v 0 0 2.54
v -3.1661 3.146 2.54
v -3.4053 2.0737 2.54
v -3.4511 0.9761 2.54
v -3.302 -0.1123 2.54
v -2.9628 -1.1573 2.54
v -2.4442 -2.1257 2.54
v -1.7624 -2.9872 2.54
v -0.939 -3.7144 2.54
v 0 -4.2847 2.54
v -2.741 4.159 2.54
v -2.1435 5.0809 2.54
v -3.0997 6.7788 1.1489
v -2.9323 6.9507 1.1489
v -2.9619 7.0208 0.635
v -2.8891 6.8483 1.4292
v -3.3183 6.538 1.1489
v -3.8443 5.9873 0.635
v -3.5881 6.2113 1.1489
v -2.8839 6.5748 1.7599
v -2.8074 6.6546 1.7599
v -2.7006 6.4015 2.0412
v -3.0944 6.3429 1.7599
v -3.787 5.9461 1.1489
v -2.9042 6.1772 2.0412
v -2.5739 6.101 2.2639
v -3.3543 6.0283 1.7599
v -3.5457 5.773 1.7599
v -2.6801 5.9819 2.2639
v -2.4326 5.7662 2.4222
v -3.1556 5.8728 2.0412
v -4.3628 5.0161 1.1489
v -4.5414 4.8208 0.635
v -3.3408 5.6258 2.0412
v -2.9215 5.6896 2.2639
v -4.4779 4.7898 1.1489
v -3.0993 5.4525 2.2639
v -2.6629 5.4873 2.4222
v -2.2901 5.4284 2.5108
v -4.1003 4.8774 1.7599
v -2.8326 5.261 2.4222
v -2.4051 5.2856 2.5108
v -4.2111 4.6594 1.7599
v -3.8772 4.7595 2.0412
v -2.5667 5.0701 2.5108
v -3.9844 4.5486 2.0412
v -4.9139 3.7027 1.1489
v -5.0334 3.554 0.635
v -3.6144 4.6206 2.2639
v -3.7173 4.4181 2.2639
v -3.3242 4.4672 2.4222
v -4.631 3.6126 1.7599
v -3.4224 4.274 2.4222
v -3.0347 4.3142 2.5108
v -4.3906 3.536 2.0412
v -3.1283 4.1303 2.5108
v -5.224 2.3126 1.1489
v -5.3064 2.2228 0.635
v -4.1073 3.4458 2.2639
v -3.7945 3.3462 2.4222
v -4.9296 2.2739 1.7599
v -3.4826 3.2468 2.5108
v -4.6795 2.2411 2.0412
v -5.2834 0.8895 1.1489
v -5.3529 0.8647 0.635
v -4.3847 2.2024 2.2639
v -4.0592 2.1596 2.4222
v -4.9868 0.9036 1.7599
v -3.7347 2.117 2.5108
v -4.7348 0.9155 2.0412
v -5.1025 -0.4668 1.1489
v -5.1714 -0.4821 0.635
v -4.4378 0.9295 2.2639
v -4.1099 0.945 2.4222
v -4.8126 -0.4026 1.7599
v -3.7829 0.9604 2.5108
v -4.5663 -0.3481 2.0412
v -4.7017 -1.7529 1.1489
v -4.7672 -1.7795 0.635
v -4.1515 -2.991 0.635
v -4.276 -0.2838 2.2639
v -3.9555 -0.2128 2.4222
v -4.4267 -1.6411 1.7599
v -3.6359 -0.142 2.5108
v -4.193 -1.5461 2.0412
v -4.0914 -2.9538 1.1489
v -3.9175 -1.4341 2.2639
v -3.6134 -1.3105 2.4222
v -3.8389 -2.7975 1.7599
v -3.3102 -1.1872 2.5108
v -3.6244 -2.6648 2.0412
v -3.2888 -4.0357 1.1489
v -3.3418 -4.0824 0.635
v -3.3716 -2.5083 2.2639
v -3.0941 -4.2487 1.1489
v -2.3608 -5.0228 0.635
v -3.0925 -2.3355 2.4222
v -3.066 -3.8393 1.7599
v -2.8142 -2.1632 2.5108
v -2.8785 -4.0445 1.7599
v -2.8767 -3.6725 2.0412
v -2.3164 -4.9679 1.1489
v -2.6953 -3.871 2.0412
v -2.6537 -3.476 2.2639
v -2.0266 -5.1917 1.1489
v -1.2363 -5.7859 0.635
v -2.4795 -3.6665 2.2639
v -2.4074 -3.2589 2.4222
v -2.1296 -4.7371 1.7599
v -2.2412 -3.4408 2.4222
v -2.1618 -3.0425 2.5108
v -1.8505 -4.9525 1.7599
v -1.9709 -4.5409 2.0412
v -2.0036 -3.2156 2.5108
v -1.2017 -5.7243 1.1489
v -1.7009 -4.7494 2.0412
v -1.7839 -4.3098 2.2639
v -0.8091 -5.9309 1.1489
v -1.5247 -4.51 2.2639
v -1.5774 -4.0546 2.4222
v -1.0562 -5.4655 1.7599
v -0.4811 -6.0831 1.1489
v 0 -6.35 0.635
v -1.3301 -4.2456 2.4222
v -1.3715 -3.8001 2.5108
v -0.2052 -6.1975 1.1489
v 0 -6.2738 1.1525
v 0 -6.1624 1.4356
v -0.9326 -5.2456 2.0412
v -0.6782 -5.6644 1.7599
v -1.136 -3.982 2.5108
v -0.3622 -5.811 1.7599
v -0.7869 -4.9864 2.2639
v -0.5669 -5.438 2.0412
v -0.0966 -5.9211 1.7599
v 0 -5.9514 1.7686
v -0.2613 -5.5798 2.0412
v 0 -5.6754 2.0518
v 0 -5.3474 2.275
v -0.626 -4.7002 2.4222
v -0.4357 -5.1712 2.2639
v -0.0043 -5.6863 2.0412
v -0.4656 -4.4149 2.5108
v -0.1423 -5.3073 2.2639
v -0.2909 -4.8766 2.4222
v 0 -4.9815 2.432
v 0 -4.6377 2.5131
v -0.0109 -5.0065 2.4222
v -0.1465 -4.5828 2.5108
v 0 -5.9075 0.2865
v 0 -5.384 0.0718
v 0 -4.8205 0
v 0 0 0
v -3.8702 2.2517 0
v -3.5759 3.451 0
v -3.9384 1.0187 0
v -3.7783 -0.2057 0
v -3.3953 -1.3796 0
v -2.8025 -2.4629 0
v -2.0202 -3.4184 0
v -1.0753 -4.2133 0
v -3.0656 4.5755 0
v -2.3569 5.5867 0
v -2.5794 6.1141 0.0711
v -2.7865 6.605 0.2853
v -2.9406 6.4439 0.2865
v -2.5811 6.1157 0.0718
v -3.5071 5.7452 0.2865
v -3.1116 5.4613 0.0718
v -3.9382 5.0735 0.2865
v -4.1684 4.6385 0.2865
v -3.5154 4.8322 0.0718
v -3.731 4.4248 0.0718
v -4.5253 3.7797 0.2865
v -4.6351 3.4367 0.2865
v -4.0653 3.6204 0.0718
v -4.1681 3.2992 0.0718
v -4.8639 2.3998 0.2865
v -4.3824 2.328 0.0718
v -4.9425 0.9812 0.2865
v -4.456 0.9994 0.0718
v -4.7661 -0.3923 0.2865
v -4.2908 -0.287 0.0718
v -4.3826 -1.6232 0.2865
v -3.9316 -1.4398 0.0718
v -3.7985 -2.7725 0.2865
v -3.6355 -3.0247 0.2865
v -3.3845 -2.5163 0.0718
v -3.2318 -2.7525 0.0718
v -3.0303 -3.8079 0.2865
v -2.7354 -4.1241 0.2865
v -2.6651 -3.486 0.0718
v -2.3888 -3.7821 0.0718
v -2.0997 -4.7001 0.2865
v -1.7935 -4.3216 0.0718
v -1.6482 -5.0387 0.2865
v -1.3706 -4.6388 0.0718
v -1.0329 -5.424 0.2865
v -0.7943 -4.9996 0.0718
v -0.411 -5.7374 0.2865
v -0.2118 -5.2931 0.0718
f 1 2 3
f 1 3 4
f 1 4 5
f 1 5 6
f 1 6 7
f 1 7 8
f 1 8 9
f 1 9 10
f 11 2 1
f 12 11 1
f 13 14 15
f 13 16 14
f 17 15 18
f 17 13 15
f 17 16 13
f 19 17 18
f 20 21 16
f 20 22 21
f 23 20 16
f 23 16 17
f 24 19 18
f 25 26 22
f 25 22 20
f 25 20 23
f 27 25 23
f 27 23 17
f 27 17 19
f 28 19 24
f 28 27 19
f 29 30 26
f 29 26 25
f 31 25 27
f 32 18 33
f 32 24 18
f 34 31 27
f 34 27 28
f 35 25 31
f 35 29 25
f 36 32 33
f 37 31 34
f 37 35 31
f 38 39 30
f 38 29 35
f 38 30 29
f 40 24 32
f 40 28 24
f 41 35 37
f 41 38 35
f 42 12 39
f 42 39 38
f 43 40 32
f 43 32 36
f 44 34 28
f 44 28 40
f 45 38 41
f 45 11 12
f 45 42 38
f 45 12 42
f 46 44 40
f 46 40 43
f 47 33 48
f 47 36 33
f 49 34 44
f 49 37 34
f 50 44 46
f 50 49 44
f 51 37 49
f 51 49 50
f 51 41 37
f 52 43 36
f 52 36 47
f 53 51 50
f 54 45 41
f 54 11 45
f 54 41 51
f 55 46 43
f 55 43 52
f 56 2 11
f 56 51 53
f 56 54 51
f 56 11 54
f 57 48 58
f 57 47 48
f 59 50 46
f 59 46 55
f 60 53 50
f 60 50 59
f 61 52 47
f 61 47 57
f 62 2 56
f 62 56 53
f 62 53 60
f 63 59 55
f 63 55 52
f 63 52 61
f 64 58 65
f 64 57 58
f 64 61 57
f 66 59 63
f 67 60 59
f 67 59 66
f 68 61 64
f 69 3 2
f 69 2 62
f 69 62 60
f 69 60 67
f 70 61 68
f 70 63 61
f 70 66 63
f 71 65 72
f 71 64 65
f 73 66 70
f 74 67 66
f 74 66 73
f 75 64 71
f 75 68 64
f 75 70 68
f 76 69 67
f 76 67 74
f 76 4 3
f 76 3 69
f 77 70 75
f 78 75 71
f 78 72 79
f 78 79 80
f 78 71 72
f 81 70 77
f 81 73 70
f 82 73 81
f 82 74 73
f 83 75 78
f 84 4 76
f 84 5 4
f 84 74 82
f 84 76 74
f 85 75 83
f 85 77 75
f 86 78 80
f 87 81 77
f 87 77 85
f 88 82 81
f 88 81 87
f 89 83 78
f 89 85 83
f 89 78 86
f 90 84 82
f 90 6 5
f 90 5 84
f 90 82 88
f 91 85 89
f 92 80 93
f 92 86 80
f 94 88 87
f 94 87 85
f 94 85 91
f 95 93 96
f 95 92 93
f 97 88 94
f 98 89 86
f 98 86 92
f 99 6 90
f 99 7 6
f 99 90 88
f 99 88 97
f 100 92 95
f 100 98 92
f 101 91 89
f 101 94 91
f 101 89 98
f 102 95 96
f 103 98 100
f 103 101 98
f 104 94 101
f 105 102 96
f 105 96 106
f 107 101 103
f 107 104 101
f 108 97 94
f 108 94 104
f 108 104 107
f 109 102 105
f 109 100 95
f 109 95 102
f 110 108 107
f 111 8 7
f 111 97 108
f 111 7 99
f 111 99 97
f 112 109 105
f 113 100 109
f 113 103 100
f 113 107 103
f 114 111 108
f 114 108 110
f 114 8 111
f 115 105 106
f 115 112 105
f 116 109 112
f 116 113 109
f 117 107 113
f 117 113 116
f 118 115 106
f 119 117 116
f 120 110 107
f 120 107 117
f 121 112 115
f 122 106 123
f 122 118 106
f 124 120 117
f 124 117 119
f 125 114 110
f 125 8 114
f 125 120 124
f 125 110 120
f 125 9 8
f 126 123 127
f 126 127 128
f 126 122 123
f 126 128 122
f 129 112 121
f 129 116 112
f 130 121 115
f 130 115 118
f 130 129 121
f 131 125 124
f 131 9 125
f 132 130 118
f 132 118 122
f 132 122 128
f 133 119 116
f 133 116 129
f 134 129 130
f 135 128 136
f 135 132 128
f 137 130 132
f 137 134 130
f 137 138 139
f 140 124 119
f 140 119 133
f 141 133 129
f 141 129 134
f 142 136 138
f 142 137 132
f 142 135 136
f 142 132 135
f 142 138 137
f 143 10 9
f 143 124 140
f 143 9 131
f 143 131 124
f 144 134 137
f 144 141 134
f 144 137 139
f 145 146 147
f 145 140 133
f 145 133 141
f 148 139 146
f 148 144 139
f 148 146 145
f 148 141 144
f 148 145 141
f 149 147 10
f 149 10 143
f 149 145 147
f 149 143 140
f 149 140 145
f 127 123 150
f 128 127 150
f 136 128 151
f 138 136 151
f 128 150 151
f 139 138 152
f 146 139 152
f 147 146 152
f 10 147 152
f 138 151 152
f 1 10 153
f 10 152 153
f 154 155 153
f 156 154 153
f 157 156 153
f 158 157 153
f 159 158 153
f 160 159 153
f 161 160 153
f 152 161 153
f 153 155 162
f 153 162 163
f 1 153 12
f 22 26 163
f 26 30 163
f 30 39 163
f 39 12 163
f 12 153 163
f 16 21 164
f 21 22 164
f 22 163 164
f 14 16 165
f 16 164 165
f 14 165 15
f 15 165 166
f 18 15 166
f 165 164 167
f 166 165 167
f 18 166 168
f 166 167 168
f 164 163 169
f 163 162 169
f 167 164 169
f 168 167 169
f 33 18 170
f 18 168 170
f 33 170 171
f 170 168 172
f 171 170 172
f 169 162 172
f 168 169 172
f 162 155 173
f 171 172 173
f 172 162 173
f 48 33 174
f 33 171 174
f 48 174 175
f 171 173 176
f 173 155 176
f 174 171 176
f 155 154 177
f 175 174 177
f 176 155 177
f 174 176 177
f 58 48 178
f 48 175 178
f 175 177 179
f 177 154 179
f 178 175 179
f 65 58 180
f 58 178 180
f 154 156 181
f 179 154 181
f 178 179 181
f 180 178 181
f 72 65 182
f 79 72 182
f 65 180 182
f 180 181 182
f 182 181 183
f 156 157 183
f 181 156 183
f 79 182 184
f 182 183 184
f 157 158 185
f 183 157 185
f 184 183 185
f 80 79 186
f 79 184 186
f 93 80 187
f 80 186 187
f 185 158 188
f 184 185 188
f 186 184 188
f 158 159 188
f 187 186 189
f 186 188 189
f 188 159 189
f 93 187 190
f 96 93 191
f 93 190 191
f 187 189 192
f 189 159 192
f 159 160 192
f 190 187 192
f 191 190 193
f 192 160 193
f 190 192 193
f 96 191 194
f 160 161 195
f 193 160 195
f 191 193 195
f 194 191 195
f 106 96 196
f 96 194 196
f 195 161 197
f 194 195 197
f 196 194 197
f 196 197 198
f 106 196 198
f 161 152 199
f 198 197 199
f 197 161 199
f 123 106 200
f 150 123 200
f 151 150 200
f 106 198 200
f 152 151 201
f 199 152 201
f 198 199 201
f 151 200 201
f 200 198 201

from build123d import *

# Parameters (mm, degrees)
F1_DEPTH    = 2.54
F2_R        = 1.905
F3_T2_ANGLE = 165.8998366825


# Not quite as in the source:
# - a fillet or chamfer that OpenCascade refuses, or shapes differently, is made with other operations: its cross-section is extruded or revolved along the edge and cut away or added


with BuildPart() as f1:
    # F0 (on Top) → F1 (new body)
    with BuildSketch(Plane.XY):
        with BuildLine():
            Line((0, -6.35), (0, 0))
            Line((0, 0), (-2.9618976002, 7.0207950124))
            ThreePointArc((-2.9618976002, 7.0207950124), (-5.171443726, -0.4821206784), (0, -6.35))
        make_face()
    extrude(amount=F1_DEPTH)

    # F2
    f2_edges = [f1.edges().sort_by_distance(p)[0] for p in [
        (-5.171444, -0.482121, 2.54),
    ]]
    fillet(f2_edges, radius=F2_R)

    # F3: fillet of radius 1.905 on 1 edges, made by hand

    # F3_s1 → F3_t2 (revolve, cut)
    with BuildSketch(Plane(origin=(2.823536152, 1.0021154347, 0), x_dir=(0, 0, 1), z_dir=(0.942405074, 0.3344737307, 0))):
        with BuildLine():
            ThreePointArc((0.635, -8.3742865468), (0.1659808799, -7.7320963745), (0, -6.9543833811))
            Line((0, -6.9543833811), (0, -8.3742865468))
            Line((0, -8.3742865468), (0.635, -8.3742865468))
        make_face()
    revolve(axis=Axis((2.7291622611, 1.2680210216, 0), (0, 0, 1)), revolution_arc=F3_T2_ANGLE, mode=Mode.SUBTRACT)


solid = f1.part
